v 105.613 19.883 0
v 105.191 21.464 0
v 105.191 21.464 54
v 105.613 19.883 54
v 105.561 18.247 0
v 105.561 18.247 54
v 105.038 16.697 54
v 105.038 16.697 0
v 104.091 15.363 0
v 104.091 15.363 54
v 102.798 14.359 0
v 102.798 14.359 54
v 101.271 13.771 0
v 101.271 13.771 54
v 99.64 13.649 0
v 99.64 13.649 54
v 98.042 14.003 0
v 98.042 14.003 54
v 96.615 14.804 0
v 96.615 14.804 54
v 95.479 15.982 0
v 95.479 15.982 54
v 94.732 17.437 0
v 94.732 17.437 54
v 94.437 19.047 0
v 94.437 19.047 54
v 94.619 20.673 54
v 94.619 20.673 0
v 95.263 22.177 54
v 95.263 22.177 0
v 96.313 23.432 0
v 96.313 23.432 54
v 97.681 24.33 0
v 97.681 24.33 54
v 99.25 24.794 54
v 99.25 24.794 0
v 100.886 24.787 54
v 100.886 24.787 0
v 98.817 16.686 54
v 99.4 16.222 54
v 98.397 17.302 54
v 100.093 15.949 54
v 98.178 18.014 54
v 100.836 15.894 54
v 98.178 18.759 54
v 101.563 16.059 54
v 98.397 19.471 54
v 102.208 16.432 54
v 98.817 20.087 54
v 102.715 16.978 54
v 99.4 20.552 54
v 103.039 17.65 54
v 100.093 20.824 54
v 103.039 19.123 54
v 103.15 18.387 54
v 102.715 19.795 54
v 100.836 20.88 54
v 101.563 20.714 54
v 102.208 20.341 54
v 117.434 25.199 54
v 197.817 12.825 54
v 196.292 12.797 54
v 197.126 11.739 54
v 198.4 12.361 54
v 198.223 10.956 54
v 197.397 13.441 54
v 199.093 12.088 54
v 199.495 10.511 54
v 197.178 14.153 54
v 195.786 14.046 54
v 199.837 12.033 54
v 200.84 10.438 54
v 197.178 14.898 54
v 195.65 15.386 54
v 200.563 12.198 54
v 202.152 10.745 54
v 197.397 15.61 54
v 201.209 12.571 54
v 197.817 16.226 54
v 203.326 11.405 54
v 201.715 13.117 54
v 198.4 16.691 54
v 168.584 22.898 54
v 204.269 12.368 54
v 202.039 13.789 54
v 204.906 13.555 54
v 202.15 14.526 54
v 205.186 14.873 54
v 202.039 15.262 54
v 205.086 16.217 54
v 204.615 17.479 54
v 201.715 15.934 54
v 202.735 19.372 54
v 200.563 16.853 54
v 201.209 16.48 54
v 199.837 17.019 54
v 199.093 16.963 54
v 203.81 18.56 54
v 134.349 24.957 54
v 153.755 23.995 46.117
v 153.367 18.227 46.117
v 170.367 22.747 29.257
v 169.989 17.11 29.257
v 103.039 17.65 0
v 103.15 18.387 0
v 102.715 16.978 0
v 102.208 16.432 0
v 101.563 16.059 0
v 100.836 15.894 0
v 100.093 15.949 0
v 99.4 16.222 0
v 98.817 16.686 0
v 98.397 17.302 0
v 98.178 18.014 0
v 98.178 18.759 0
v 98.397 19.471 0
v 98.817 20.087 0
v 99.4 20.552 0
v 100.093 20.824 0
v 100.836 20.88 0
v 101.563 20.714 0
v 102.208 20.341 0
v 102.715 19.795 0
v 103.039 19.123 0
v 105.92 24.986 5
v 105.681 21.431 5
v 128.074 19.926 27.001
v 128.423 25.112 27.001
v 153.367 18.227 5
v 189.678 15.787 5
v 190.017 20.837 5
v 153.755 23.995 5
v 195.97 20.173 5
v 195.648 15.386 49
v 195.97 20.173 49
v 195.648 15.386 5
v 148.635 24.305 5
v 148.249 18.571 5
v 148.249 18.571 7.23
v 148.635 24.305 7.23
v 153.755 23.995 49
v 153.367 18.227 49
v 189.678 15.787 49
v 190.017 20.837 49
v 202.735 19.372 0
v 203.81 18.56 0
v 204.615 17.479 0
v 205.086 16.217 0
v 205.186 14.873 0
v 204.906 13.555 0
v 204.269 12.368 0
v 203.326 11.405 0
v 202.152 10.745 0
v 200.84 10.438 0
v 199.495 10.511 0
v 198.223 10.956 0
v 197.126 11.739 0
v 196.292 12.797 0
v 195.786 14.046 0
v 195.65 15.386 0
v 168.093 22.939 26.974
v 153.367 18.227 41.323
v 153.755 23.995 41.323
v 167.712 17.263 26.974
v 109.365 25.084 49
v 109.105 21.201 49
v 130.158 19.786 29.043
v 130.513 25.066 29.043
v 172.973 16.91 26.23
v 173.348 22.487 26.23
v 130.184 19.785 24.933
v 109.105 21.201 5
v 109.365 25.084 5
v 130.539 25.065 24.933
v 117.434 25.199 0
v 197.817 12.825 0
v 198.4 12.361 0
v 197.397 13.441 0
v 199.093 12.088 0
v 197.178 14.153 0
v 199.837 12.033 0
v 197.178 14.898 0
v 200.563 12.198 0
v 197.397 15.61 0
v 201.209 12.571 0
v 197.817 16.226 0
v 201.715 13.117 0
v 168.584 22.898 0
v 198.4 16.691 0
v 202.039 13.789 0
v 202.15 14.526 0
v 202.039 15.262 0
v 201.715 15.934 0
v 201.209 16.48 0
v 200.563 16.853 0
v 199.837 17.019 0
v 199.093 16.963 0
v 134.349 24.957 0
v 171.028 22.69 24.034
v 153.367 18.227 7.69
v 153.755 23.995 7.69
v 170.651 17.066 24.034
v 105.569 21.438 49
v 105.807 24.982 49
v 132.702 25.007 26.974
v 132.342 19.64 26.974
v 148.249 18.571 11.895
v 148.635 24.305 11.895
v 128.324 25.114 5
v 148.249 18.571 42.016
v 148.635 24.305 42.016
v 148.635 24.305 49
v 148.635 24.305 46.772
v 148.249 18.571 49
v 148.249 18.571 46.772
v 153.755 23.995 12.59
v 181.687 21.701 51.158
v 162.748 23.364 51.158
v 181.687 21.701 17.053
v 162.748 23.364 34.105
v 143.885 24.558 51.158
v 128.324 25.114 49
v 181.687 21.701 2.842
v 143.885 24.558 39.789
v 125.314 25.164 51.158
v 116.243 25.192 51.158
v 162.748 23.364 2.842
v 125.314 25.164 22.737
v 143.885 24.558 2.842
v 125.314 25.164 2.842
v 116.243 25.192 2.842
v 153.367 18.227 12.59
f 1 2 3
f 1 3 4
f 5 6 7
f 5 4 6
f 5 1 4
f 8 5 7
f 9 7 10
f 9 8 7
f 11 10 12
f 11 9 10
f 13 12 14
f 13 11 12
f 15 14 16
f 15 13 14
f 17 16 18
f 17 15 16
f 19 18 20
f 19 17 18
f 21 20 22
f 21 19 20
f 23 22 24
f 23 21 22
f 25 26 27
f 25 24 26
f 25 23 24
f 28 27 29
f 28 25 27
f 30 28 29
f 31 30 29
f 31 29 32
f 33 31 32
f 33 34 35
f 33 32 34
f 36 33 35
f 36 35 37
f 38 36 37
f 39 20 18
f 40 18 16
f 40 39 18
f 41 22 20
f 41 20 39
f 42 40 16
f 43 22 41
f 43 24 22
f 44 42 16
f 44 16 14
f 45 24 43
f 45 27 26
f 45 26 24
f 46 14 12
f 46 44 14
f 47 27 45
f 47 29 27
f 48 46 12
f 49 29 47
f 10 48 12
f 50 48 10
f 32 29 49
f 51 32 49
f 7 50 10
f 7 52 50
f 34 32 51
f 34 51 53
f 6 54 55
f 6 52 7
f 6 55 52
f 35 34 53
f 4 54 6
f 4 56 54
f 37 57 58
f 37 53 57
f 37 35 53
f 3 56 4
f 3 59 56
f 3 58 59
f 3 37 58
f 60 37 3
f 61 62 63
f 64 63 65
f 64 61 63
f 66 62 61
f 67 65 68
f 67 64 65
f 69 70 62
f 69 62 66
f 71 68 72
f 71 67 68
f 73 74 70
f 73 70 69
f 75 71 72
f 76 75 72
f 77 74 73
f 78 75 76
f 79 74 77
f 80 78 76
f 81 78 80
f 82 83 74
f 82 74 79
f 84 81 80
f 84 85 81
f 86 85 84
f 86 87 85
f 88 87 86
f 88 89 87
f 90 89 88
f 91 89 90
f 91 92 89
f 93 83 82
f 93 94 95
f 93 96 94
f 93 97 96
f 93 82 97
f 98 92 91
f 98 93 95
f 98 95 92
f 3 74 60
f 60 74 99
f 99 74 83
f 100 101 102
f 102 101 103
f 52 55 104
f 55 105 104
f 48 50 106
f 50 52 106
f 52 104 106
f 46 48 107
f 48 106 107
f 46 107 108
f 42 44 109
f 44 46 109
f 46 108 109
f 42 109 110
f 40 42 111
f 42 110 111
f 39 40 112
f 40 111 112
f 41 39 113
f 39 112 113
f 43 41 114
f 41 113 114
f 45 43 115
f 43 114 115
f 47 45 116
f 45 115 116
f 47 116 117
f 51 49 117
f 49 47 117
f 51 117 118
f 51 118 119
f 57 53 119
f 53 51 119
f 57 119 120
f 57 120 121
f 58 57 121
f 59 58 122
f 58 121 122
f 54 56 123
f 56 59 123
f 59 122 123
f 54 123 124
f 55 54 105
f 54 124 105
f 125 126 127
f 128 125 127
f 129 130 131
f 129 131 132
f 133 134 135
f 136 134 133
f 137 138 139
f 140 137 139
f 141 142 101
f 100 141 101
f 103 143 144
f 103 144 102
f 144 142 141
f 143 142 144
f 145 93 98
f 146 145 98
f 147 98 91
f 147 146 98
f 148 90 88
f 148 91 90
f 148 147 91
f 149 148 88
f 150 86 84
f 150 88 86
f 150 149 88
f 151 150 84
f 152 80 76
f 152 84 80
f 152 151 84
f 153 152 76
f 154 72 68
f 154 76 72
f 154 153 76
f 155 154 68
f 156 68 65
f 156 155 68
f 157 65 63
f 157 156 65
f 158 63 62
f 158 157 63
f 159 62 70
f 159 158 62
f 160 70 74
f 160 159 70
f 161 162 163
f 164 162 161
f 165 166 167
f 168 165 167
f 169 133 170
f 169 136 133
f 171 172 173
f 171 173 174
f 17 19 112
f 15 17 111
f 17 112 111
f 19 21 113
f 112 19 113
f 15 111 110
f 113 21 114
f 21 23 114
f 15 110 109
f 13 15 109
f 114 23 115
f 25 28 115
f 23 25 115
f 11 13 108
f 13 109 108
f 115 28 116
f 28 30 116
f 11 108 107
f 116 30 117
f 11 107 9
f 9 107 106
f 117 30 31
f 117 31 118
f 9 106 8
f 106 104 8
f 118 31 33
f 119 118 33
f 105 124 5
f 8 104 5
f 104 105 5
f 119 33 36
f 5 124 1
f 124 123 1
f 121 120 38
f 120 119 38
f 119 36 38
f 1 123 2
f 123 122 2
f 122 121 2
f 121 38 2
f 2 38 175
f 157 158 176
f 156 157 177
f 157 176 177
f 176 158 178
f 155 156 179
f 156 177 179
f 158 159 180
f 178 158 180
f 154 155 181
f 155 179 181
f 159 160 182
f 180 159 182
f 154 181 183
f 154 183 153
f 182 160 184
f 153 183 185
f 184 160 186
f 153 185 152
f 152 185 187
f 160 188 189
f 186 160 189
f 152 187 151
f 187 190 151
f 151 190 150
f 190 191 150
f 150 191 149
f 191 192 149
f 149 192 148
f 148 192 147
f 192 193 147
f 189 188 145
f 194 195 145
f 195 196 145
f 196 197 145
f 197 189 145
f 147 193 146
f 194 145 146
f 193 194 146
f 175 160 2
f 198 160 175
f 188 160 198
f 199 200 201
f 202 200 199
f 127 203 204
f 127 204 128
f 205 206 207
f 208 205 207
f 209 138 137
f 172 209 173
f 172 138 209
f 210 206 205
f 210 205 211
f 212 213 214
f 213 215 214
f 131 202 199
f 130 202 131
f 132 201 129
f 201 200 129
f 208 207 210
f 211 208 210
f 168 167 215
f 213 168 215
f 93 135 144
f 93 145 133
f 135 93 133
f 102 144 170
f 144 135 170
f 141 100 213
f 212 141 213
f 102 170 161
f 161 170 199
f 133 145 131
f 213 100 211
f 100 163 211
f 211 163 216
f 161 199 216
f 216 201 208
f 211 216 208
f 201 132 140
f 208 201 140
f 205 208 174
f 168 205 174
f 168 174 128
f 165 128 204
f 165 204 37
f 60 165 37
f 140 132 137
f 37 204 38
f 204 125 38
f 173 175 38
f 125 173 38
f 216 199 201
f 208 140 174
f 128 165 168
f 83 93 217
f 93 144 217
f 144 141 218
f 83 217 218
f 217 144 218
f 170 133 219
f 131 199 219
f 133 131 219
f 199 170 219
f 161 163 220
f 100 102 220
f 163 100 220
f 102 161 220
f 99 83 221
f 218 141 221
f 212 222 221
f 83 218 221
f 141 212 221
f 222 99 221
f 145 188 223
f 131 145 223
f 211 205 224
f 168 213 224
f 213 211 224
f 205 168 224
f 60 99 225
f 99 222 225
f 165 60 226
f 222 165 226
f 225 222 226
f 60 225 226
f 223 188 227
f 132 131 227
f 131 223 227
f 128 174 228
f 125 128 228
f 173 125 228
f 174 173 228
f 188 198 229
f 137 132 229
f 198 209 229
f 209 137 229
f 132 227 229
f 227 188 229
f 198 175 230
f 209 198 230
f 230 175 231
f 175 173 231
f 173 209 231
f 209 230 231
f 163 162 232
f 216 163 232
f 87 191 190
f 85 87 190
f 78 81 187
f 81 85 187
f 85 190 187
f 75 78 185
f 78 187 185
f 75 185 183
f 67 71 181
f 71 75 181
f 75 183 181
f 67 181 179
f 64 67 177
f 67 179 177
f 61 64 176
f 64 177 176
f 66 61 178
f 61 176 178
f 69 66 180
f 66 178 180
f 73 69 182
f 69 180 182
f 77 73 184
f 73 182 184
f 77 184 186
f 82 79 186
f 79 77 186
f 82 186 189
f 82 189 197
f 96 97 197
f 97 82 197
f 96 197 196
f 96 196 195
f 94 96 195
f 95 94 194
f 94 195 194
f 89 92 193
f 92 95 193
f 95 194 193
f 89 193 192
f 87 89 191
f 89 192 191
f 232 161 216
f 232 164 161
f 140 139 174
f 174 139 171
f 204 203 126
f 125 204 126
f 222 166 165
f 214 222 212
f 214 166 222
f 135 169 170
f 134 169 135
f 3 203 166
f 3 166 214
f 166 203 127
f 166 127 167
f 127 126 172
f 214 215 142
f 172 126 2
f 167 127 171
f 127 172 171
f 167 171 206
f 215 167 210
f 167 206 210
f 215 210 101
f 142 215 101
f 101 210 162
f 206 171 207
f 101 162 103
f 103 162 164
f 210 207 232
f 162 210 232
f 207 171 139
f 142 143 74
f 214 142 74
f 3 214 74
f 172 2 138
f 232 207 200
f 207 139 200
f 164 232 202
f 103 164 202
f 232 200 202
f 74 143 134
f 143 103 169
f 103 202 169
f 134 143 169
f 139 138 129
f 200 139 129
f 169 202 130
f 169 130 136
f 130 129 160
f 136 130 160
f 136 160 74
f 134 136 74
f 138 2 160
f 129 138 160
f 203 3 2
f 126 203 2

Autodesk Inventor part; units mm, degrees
ref_plane "YZ Plane" through (0, 0, 0) normal (1, 0, 0) x (0, 1, 0)
ref_plane "XZ Plane" through (0, 0, 0) normal (0, 1, 0) x (-1, 0, 0)
ref_plane "XY Plane" through (0, 0, 0) normal (0, 0, 1) x (1, 0, 0)
sketch "Sketch2" plane through (0, 0, 0) normal (0, 0, 1) x (1, 0, 0)
  spline S0 degree 5 number of poles 204
  circle A0 centre (79.5137, 4.5678) radius 15.1135
  line L0 (79.5137, 4.5678) -> (79.5137, -15.4763) construction
  line L1 (79.5137, 4.5678) -> (209.6498, 4.5678) construction
  line L2 (319.6498, 0.0573) -> (219.6498, 0.0573) construction
  line L3 (219.6499, 18.7671) -> (219.6499, 18.7671) construction
  line L4 (28.0055, 4.5054) -> (28.0055, -2.4946)
  line L5 (19.6272, 1.0326) -> (319.6498, 0.0573) construction
  line L6 (49.7105, 14.4213) -> (55.6079, 14.4213)
  line L7 (49.7104, -8.4915) -> (55.6078, -8.4915)
  line L8 (28.0055, 4.5054) -> (49.7105, 14.4213)
  line L9 (28.0055, -2.4946) -> (49.7104, -8.4915)
  line L10 (55.6079, 14.4213) -> (55.6079, 20.8729)
  line L11 (55.6078, -8.4915) -> (55.6078, -14.1513)
  line L12 (108.6496, 16.3299) -> (108.6496, -7.1942)
  line L13 (110.8735, -9.1817) -> (193.8736, 0.1678)
  line L14 (195.6498, 2.1552) -> (195.6498, 6.9805)
  arc A1 (108.6496, -7.1942) -> (110.8735, -9.1817) centre (110.6496, -7.1942) ccw
  arc A2 (193.8736, 0.1678) -> (195.6498, 2.1552) centre (193.6498, 2.1552) ccw
  circle A3 centre (209.6498, 0.0573) radius 6.214
  line L15 (108.6496, 18.5678) -> (195.6498, 8.7678)
  circle A4 centre (100.6496, 18.3866) radius 2.5
  circle A5 centre (199.6498, 14.5256) radius 2.5
  spline S1 degree 4 poles (202.7347, 19.3724) (199.838, 19.7251) (195.7649, 20.2061) (190.5032, 20.7952) (184.0435, 21.4697) (179.3239, 21.937) (174.5933, 22.3806) (169.8562, 22.7962) (165.1183, 23.1863) (160.3828, 23.5463) (155.6566, 23.8767) (150.936, 24.1762) (146.2498, 24.4444) (141.5311, 24.676) (136.9019, 24.8782) (132.2312, 25.0296) (127.6189, 25.1375) (123.0371, 25.1983) (118.5028, 25.2125) (112.3622, 25.1677) (107.3995, 25.0507) (103.5849, 24.9119) (100.8865, 24.7866) knots 0 0 0 0 0 0.114234 0.16008 0.206003 0.251978 0.297982 0.343994 0.389991 0.435949 0.481846 0.527693 0.573431 0.619092 0.664656 0.710064 0.755333 0.800383 0.845191 0.889734 1 1 1 1 1
  line L16 (105.191, 21.4637) -> (195.6498, 15.3862)
  arc A6 (100.8865, 24.7866) -> (105.191, 21.4637) centre (100.0416, 19.2427) ccw
  arc A7 (195.6498, 15.3862) -> (202.7347, 19.3724) centre (200.4212, 15.1951) ccw
  point P0 (0, 0)
  point P1 (319.5771, 0.0748)
  point P2 (319.3573, 0.1272)
  point P3 (318.9916, 0.2136)
  point P4 (318.4804, 0.3362)
  point P5 (317.8238, 0.4909)
  point P6 (317.0222, 0.6802)
  point P7 (316.0769, 0.9024)
  point P8 (314.9885, 1.1569)
  point P9 (313.7582, 1.443)
  point P10 (312.3866, 1.7598)
  point P11 (310.8752, 2.1063)
  point P12 (309.2258, 2.4819)
  point P13 (307.4393, 2.8854)
  point P14 (305.5178, 3.3153)
  point P15 (303.4628, 3.7707)
  point P16 (301.2764, 4.2501)
  point P17 (298.9607, 4.7526)
  point P18 (296.5175, 5.2764)
  point P19 (293.9492, 5.8203)
  point P20 (291.2585, 6.3828)
  point P21 (288.4478, 6.9627)
  point P22 (285.5195, 7.5582)
  point P23 (282.4766, 8.1678)
  point P24 (279.3218, 8.79)
  point P25 (276.0584, 9.4236)
  point P26 (272.6891, 10.0668)
  point P27 (269.2175, 10.7178)
  point P28 (265.6469, 11.3757)
  point P29 (261.9803, 12.0381)
  point P30 (258.2219, 12.7041)
  point P31 (254.3747, 13.3722)
  point P32 (250.4426, 14.0403)
  point P33 (246.4295, 14.7072)
  point P34 (242.339, 15.3714)
  point P35 (238.1756, 16.0311)
  point P36 (233.9428, 16.6851)
  point P37 (229.6454, 17.3316)
  point P38 (225.2869, 17.9694)
  point P39 (220.8723, 18.5967)
  point P40 (216.4049, 19.2123)
  point P41 (211.8901, 19.8144)
  point P42 (207.332, 20.4015)
  point P43 (202.7347, 20.9724)
  point P44 (198.1034, 21.5256)
  point P45 (193.4423, 22.0596)
  point P46 (188.7563, 22.5726)
  point P47 (184.0499, 23.0637)
  point P48 (179.3279, 23.5314)
  point P49 (174.5948, 23.9745)
  point P50 (169.8554, 24.3909)
  point P51 (165.1148, 24.7803)
  point P52 (160.3775, 25.1406)
  point P53 (155.6479, 25.4709)
  point P54 (150.9316, 25.7703)
  point P55 (146.233, 26.0373)
  point P56 (141.557, 26.2707)
  point P57 (136.8821, 26.4681)
  point P58 (132.2209, 26.6211)
  point P59 (127.5964, 26.7282)
  point P60 (123.0133, 26.7888)
  point P61 (118.4727, 26.8026)
  point P62 (113.9902, 26.7693)
  point P63 (109.5601, 26.6886)
  point P64 (105.191, 26.5611)
  point P65 (100.8865, 26.3866)
  point P66 (96.6524, 26.1647)
  point P67 (92.4927, 25.8975)
  point P68 (88.412, 25.5858)
  point P69 (84.409, 25.3061)
  point P70 (80.8803, 24.9766)
  point P71 (76.6761, 24.4558)
  point P72 (72.9631, 23.8932)
  point P73 (69.3402, 23.3612)
  point P74 (65.8208, 22.7938)
  point P75 (62.4086, 22.1884)
  point P76 (59.1071, 21.5462)
  point P77 (52.8493, 20.1606)
  point P78 (49.7107, 19.4213)
  point P79 (47.0737, 18.6508)
  point P80 (44.3741, 17.8542)
  point P81 (41.8033, 17.0323)
  point P82 (39.3638, 16.1875)
  point P83 (37.0582, 15.3214)
  point P84 (34.8883, 14.4364)
  point P85 (32.8567, 13.534)
  point P86 (30.9649, 12.6166)
  point P87 (29.2144, 11.686)
  point P88 (27.607, 10.7437)
  point P89 (26.1442, 9.7921)
  point P90 (24.8269, 8.8324)
  point P91 (23.6566, 7.8664)
  point P92 (22.6337, 6.8952)
  point P93 (21.7592, 5.9208)
  point P94 (21.0335, 4.944)
  point P95 (20.4573, 3.966)
  point P96 (20.031, 2.9874)
  point P97 (19.7541, 2.0097)
  point P98 (19.6496, 0.0598)
  point P99 (19.8207, -0.9032)
  point P100 (20.1378, -1.8356)
  point P101 (20.6004, -2.7401)
  point P102 (21.2081, -3.6158)
  point P103 (21.9599, -4.4627)
  point P104 (22.8545, -5.2806)
  point P105 (23.891, -6.069)
  point P106 (25.0682, -6.8277)
  point P107 (26.3845, -7.5561)
  point P108 (27.8383, -8.2539)
  point P109 (29.4283, -8.9211)
  point P110 (31.1522, -9.5571)
  point P111 (33.0086, -10.1613)
  point P112 (34.9949, -10.734)
  point P113 (37.1093, -11.2746)
  point P114 (39.3497, -11.7828)
  point P115 (41.7134, -12.2586)
  point P116 (44.1979, -12.702)
  point P117 (46.8014, -13.1127)
  point P118 (49.7105, -13.4915)
  point P119 (52.3532, -13.8357)
  point P120 (58.3469, -14.4294)
  point P121 (61.5023, -14.678)
  point P122 (64.7591, -14.8953)
  point P123 (68.1149, -15.0813)
  point P124 (71.5661, -15.237)
  point P125 (75.1094, -15.3627)
  point P126 (78.7418, -15.4596)
  point P127 (82.46, -15.528)
  point P128 (86.2607, -15.5691)
  point P129 (90.14, -15.5838)
  point P130 (94.0946, -15.5733)
  point P131 (98.1212, -15.5388)
  point P132 (102.2159, -15.4812)
  point P133 (106.3751, -15.4023)
  point P134 (110.5952, -15.303)
  point P135 (114.872, -15.1845)
  point P136 (119.2022, -15.0489)
  point P137 (123.5813, -14.8971)
  point P138 (128.006, -14.7306)
  point P139 (132.4718, -14.5509)
  point P140 (136.9748, -14.3598)
  point P141 (141.5285, -14.1576)
  point P142 (146.1365, -13.9383)
  point P143 (150.7679, -13.7022)
  point P144 (155.4191, -13.4499)
  point P145 (160.0853, -13.1829)
  point P146 (164.7617, -12.9024)
  point P147 (169.4444, -12.6099)
  point P148 (174.1283, -12.306)
  point P149 (178.8092, -11.9925)
  point P150 (183.4823, -11.67)
  point P151 (188.1434, -11.34)
  point P152 (192.7877, -11.0037)
  point P153 (197.4107, -10.6614)
  point P154 (202.0079, -10.3149)
  point P155 (206.5747, -9.9645)
  point P156 (211.1069, -9.6117)
  point P157 (215.5999, -9.2568)
  point P158 (220.0489, -8.9007)
  point P159 (224.4503, -8.5446)
  point P160 (228.7987, -8.1885)
  point P161 (233.0906, -7.8339)
  point P162 (237.3214, -7.4808)
  point P163 (241.4866, -7.1298)
  point P164 (245.5828, -6.7821)
  point P165 (249.6052, -6.4377)
  point P166 (253.5502, -6.0972)
  point P167 (257.4136, -5.7612)
  point P168 (261.1915, -5.4303)
  point P169 (264.88, -5.1051)
  point P170 (268.4758, -4.7856)
  point P171 (271.9747, -4.4724)
  point P172 (275.3734, -4.1661)
  point P173 (278.6686, -3.867)
  point P174 (281.8564, -3.5757)
  point P175 (284.9344, -3.2925)
  point P176 (287.8984, -3.018)
  point P177 (290.7463, -2.7525)
  point P178 (293.4745, -2.4963)
  point P179 (296.0806, -2.2503)
  point P180 (298.5616, -2.0142)
  point P181 (300.9151, -1.7892)
  point P182 (303.1387, -1.575)
  point P183 (305.23, -1.3728)
  point P184 (307.1866, -1.1823)
  point P185 (309.007, -1.0041)
  point P186 (310.6885, -0.8385)
  point P187 (312.2302, -0.6861)
  point P188 (313.6297, -0.5471)
  point P189 (314.8861, -0.4221)
  point P190 (315.9976, -0.3107)
  point P191 (316.9636, -0.214)
  point P192 (317.7826, -0.1311)
  point P193 (318.4538, -0.0643)
  point P194 (318.9765, -0.0102)
  point P195 (319.3503, 0.027)
  point P196 (319.5743, 0.0497)
  point P197 (28.0055, 1.0054)
  point P198 (108.6496, -9.4322)
  point P199 (195.6498, 0.3678)
  dimension "d37" = 30.227
  dimension "d2" = 300.0001
  dimension "d19" = 110
  dimension "d22" = 100
  dimension "d23" = 7
  dimension "d24" = 5
  dimension "d25" = 5
  dimension "d30" = 28
  dimension "d31" = 8.4
  dimension "d33" = 14
  dimension "d39" = 59.8865
  dimension "d42" = 12.428
  dimension "d43" = 5
  dimension "d44" = 5
  dimension "d49" = 1.6
  dimension "d50" = 1.6
  dimension "d51" = 1.6
  dimension "d52" = 1.6
  dimension "d53" = 1.6
  dimension "d54" = 1.6
  dimension "d55" = 1.6
  dimension "d56" = 1.6
  dimension "d57" = 1.6
  dimension "d58" = 1.6
  dimension "d59" = 1.6
  dimension "d60" = 1.6
  dimension "d61" = 1.6
  dimension "d62" = 1.6
  dimension "d63" = 1.6
  dimension "d64" = 1.6
  dimension "d65" = 1.6
  dimension "d66" = 1.6
  dimension "d67" = 1.6
  dimension "d68" = 1.6
  dimension "d69" = 1.6
  dimension "d70" = 1.6
  dimension "d72" = 1.6
  dimension "d75" = 4
  dimension "d76" = 7
  dimension "d90" = 8
  dimension "d91" = 8
extrude "Extrusion8" add sketch "Sketch2" along normal blind 54 contours A7 L16 A6 S1
sketch "Sketch3" plane through (195.6498, 15.3862, 0) normal (-0.067, -0.9978, 0) x (0.9978, -0.067, 0)
  line L0 (-0.0017, 49) -> (-0.0017, 5)
  line L1 (-0.0017, 5) -> (-22.7277, 26.2297)
  line L2 (-22.7277, 26.2297) -> (-0.0017, 49)
  line L3 (-67.7277, 27.0011) -> (-45.2277, 49.0011)
  line L4 (-45.2277, 49.0011) -> (-45.2277, 5.0011)
  line L5 (-45.2277, 5.0011) -> (-67.7277, 27.0011)
  line L6 (-45.2277, 49.0011) -> (-22.7277, 26.2297)
  line L7 (-45.2277, 5.0011) -> (-22.7277, 26.2297)
  line L8 (9.5487, 54) -> (0, 54) projected
  line L9 (9.5487, 0) -> (0, 0) projected
  line L10 (-90.2837, 49) -> (-90.1718, 5)
  line L11 (-90.1718, 5) -> (-67.7277, 27.0011)
  line L12 (-90.2837, 49) -> (-67.7277, 27.0011)
  line L13 (-90.0437, 54) -> (-101.2596, 54) projected
  line L14 (-90.0437, 0) -> (-101.2596, 0) projected
  line L15 (-90.2837, 49) -> (-0.0017, 49)
  line L16 (-0.0017, 5) -> (-90.1718, 5)
  line L17 (-86.7403, 49) -> (-45.0868, 9.6057)
  line L18 (-86.7403, 5) -> (-45.2277, 44.1668)
  line L19 (-45.2277, 44.1668) -> (-5.985, 5)
  line L20 (-5.985, 49) -> (-45.2277, 9.739)
  line L21 (-47.5072, 5) -> (-47.5072, 49)
  line L22 (-42.3779, 49) -> (-42.3779, 5)
  point P0 (-194.1783, 0)
  point P1 (-90.6627, 0)
  point P2 (-45.2277, 27.0011)
  point P3 (6.8018, 54)
  point P4 (6.8018, 0)
  point P5 (-95.1802, 54)
  point P6 (-90.6627, 54)
  point P7 (-95.1802, 0)
  point P8 (-28.0012, 26.9736)
  point P9 (-63.4507, 26.9736)
  point P10 (-25.7189, 29.2569)
  point P11 (-45.2266, 49)
  point P12 (-65.6391, 29.0433)
  point P13 (-45.2288, 49)
  point P14 (-25.0554, 24.0335)
  point P15 (-65.6131, 24.9334)
  point P16 (-42.3779, 7.6899)
  point P17 (-42.3779, 41.3225)
  point P18 (-42.3779, 12.5902)
  point P19 (-42.3779, 46.1169)
  point P20 (-47.5072, 46.7723)
  point P21 (-47.5072, 7.23)
  point P22 (-47.5072, 11.8949)
  point P23 (-47.5072, 42.0161)
  dimension "d81" = 22.5
  dimension "d82" = 22.5
  dimension "d83" = 5
  dimension "d84" = 5
  dimension "d85" = 22.5
  dimension "d86" = 5
  dimension "d87" = 5
extrude "Extrusion9" cut sketch "Sketch3" against normal blind 10 contours L0 L1 L2 | L20 L6 L22 L15 | L16 L22 L7 L19 | L20 L22 L19 | L3 L17 L15 L21 | L21 L16 L18 L5 | L21 L17 L18 | L11 L10 L12
properties part number "2414 basic aerofoil" material "Plywood, Finish"
